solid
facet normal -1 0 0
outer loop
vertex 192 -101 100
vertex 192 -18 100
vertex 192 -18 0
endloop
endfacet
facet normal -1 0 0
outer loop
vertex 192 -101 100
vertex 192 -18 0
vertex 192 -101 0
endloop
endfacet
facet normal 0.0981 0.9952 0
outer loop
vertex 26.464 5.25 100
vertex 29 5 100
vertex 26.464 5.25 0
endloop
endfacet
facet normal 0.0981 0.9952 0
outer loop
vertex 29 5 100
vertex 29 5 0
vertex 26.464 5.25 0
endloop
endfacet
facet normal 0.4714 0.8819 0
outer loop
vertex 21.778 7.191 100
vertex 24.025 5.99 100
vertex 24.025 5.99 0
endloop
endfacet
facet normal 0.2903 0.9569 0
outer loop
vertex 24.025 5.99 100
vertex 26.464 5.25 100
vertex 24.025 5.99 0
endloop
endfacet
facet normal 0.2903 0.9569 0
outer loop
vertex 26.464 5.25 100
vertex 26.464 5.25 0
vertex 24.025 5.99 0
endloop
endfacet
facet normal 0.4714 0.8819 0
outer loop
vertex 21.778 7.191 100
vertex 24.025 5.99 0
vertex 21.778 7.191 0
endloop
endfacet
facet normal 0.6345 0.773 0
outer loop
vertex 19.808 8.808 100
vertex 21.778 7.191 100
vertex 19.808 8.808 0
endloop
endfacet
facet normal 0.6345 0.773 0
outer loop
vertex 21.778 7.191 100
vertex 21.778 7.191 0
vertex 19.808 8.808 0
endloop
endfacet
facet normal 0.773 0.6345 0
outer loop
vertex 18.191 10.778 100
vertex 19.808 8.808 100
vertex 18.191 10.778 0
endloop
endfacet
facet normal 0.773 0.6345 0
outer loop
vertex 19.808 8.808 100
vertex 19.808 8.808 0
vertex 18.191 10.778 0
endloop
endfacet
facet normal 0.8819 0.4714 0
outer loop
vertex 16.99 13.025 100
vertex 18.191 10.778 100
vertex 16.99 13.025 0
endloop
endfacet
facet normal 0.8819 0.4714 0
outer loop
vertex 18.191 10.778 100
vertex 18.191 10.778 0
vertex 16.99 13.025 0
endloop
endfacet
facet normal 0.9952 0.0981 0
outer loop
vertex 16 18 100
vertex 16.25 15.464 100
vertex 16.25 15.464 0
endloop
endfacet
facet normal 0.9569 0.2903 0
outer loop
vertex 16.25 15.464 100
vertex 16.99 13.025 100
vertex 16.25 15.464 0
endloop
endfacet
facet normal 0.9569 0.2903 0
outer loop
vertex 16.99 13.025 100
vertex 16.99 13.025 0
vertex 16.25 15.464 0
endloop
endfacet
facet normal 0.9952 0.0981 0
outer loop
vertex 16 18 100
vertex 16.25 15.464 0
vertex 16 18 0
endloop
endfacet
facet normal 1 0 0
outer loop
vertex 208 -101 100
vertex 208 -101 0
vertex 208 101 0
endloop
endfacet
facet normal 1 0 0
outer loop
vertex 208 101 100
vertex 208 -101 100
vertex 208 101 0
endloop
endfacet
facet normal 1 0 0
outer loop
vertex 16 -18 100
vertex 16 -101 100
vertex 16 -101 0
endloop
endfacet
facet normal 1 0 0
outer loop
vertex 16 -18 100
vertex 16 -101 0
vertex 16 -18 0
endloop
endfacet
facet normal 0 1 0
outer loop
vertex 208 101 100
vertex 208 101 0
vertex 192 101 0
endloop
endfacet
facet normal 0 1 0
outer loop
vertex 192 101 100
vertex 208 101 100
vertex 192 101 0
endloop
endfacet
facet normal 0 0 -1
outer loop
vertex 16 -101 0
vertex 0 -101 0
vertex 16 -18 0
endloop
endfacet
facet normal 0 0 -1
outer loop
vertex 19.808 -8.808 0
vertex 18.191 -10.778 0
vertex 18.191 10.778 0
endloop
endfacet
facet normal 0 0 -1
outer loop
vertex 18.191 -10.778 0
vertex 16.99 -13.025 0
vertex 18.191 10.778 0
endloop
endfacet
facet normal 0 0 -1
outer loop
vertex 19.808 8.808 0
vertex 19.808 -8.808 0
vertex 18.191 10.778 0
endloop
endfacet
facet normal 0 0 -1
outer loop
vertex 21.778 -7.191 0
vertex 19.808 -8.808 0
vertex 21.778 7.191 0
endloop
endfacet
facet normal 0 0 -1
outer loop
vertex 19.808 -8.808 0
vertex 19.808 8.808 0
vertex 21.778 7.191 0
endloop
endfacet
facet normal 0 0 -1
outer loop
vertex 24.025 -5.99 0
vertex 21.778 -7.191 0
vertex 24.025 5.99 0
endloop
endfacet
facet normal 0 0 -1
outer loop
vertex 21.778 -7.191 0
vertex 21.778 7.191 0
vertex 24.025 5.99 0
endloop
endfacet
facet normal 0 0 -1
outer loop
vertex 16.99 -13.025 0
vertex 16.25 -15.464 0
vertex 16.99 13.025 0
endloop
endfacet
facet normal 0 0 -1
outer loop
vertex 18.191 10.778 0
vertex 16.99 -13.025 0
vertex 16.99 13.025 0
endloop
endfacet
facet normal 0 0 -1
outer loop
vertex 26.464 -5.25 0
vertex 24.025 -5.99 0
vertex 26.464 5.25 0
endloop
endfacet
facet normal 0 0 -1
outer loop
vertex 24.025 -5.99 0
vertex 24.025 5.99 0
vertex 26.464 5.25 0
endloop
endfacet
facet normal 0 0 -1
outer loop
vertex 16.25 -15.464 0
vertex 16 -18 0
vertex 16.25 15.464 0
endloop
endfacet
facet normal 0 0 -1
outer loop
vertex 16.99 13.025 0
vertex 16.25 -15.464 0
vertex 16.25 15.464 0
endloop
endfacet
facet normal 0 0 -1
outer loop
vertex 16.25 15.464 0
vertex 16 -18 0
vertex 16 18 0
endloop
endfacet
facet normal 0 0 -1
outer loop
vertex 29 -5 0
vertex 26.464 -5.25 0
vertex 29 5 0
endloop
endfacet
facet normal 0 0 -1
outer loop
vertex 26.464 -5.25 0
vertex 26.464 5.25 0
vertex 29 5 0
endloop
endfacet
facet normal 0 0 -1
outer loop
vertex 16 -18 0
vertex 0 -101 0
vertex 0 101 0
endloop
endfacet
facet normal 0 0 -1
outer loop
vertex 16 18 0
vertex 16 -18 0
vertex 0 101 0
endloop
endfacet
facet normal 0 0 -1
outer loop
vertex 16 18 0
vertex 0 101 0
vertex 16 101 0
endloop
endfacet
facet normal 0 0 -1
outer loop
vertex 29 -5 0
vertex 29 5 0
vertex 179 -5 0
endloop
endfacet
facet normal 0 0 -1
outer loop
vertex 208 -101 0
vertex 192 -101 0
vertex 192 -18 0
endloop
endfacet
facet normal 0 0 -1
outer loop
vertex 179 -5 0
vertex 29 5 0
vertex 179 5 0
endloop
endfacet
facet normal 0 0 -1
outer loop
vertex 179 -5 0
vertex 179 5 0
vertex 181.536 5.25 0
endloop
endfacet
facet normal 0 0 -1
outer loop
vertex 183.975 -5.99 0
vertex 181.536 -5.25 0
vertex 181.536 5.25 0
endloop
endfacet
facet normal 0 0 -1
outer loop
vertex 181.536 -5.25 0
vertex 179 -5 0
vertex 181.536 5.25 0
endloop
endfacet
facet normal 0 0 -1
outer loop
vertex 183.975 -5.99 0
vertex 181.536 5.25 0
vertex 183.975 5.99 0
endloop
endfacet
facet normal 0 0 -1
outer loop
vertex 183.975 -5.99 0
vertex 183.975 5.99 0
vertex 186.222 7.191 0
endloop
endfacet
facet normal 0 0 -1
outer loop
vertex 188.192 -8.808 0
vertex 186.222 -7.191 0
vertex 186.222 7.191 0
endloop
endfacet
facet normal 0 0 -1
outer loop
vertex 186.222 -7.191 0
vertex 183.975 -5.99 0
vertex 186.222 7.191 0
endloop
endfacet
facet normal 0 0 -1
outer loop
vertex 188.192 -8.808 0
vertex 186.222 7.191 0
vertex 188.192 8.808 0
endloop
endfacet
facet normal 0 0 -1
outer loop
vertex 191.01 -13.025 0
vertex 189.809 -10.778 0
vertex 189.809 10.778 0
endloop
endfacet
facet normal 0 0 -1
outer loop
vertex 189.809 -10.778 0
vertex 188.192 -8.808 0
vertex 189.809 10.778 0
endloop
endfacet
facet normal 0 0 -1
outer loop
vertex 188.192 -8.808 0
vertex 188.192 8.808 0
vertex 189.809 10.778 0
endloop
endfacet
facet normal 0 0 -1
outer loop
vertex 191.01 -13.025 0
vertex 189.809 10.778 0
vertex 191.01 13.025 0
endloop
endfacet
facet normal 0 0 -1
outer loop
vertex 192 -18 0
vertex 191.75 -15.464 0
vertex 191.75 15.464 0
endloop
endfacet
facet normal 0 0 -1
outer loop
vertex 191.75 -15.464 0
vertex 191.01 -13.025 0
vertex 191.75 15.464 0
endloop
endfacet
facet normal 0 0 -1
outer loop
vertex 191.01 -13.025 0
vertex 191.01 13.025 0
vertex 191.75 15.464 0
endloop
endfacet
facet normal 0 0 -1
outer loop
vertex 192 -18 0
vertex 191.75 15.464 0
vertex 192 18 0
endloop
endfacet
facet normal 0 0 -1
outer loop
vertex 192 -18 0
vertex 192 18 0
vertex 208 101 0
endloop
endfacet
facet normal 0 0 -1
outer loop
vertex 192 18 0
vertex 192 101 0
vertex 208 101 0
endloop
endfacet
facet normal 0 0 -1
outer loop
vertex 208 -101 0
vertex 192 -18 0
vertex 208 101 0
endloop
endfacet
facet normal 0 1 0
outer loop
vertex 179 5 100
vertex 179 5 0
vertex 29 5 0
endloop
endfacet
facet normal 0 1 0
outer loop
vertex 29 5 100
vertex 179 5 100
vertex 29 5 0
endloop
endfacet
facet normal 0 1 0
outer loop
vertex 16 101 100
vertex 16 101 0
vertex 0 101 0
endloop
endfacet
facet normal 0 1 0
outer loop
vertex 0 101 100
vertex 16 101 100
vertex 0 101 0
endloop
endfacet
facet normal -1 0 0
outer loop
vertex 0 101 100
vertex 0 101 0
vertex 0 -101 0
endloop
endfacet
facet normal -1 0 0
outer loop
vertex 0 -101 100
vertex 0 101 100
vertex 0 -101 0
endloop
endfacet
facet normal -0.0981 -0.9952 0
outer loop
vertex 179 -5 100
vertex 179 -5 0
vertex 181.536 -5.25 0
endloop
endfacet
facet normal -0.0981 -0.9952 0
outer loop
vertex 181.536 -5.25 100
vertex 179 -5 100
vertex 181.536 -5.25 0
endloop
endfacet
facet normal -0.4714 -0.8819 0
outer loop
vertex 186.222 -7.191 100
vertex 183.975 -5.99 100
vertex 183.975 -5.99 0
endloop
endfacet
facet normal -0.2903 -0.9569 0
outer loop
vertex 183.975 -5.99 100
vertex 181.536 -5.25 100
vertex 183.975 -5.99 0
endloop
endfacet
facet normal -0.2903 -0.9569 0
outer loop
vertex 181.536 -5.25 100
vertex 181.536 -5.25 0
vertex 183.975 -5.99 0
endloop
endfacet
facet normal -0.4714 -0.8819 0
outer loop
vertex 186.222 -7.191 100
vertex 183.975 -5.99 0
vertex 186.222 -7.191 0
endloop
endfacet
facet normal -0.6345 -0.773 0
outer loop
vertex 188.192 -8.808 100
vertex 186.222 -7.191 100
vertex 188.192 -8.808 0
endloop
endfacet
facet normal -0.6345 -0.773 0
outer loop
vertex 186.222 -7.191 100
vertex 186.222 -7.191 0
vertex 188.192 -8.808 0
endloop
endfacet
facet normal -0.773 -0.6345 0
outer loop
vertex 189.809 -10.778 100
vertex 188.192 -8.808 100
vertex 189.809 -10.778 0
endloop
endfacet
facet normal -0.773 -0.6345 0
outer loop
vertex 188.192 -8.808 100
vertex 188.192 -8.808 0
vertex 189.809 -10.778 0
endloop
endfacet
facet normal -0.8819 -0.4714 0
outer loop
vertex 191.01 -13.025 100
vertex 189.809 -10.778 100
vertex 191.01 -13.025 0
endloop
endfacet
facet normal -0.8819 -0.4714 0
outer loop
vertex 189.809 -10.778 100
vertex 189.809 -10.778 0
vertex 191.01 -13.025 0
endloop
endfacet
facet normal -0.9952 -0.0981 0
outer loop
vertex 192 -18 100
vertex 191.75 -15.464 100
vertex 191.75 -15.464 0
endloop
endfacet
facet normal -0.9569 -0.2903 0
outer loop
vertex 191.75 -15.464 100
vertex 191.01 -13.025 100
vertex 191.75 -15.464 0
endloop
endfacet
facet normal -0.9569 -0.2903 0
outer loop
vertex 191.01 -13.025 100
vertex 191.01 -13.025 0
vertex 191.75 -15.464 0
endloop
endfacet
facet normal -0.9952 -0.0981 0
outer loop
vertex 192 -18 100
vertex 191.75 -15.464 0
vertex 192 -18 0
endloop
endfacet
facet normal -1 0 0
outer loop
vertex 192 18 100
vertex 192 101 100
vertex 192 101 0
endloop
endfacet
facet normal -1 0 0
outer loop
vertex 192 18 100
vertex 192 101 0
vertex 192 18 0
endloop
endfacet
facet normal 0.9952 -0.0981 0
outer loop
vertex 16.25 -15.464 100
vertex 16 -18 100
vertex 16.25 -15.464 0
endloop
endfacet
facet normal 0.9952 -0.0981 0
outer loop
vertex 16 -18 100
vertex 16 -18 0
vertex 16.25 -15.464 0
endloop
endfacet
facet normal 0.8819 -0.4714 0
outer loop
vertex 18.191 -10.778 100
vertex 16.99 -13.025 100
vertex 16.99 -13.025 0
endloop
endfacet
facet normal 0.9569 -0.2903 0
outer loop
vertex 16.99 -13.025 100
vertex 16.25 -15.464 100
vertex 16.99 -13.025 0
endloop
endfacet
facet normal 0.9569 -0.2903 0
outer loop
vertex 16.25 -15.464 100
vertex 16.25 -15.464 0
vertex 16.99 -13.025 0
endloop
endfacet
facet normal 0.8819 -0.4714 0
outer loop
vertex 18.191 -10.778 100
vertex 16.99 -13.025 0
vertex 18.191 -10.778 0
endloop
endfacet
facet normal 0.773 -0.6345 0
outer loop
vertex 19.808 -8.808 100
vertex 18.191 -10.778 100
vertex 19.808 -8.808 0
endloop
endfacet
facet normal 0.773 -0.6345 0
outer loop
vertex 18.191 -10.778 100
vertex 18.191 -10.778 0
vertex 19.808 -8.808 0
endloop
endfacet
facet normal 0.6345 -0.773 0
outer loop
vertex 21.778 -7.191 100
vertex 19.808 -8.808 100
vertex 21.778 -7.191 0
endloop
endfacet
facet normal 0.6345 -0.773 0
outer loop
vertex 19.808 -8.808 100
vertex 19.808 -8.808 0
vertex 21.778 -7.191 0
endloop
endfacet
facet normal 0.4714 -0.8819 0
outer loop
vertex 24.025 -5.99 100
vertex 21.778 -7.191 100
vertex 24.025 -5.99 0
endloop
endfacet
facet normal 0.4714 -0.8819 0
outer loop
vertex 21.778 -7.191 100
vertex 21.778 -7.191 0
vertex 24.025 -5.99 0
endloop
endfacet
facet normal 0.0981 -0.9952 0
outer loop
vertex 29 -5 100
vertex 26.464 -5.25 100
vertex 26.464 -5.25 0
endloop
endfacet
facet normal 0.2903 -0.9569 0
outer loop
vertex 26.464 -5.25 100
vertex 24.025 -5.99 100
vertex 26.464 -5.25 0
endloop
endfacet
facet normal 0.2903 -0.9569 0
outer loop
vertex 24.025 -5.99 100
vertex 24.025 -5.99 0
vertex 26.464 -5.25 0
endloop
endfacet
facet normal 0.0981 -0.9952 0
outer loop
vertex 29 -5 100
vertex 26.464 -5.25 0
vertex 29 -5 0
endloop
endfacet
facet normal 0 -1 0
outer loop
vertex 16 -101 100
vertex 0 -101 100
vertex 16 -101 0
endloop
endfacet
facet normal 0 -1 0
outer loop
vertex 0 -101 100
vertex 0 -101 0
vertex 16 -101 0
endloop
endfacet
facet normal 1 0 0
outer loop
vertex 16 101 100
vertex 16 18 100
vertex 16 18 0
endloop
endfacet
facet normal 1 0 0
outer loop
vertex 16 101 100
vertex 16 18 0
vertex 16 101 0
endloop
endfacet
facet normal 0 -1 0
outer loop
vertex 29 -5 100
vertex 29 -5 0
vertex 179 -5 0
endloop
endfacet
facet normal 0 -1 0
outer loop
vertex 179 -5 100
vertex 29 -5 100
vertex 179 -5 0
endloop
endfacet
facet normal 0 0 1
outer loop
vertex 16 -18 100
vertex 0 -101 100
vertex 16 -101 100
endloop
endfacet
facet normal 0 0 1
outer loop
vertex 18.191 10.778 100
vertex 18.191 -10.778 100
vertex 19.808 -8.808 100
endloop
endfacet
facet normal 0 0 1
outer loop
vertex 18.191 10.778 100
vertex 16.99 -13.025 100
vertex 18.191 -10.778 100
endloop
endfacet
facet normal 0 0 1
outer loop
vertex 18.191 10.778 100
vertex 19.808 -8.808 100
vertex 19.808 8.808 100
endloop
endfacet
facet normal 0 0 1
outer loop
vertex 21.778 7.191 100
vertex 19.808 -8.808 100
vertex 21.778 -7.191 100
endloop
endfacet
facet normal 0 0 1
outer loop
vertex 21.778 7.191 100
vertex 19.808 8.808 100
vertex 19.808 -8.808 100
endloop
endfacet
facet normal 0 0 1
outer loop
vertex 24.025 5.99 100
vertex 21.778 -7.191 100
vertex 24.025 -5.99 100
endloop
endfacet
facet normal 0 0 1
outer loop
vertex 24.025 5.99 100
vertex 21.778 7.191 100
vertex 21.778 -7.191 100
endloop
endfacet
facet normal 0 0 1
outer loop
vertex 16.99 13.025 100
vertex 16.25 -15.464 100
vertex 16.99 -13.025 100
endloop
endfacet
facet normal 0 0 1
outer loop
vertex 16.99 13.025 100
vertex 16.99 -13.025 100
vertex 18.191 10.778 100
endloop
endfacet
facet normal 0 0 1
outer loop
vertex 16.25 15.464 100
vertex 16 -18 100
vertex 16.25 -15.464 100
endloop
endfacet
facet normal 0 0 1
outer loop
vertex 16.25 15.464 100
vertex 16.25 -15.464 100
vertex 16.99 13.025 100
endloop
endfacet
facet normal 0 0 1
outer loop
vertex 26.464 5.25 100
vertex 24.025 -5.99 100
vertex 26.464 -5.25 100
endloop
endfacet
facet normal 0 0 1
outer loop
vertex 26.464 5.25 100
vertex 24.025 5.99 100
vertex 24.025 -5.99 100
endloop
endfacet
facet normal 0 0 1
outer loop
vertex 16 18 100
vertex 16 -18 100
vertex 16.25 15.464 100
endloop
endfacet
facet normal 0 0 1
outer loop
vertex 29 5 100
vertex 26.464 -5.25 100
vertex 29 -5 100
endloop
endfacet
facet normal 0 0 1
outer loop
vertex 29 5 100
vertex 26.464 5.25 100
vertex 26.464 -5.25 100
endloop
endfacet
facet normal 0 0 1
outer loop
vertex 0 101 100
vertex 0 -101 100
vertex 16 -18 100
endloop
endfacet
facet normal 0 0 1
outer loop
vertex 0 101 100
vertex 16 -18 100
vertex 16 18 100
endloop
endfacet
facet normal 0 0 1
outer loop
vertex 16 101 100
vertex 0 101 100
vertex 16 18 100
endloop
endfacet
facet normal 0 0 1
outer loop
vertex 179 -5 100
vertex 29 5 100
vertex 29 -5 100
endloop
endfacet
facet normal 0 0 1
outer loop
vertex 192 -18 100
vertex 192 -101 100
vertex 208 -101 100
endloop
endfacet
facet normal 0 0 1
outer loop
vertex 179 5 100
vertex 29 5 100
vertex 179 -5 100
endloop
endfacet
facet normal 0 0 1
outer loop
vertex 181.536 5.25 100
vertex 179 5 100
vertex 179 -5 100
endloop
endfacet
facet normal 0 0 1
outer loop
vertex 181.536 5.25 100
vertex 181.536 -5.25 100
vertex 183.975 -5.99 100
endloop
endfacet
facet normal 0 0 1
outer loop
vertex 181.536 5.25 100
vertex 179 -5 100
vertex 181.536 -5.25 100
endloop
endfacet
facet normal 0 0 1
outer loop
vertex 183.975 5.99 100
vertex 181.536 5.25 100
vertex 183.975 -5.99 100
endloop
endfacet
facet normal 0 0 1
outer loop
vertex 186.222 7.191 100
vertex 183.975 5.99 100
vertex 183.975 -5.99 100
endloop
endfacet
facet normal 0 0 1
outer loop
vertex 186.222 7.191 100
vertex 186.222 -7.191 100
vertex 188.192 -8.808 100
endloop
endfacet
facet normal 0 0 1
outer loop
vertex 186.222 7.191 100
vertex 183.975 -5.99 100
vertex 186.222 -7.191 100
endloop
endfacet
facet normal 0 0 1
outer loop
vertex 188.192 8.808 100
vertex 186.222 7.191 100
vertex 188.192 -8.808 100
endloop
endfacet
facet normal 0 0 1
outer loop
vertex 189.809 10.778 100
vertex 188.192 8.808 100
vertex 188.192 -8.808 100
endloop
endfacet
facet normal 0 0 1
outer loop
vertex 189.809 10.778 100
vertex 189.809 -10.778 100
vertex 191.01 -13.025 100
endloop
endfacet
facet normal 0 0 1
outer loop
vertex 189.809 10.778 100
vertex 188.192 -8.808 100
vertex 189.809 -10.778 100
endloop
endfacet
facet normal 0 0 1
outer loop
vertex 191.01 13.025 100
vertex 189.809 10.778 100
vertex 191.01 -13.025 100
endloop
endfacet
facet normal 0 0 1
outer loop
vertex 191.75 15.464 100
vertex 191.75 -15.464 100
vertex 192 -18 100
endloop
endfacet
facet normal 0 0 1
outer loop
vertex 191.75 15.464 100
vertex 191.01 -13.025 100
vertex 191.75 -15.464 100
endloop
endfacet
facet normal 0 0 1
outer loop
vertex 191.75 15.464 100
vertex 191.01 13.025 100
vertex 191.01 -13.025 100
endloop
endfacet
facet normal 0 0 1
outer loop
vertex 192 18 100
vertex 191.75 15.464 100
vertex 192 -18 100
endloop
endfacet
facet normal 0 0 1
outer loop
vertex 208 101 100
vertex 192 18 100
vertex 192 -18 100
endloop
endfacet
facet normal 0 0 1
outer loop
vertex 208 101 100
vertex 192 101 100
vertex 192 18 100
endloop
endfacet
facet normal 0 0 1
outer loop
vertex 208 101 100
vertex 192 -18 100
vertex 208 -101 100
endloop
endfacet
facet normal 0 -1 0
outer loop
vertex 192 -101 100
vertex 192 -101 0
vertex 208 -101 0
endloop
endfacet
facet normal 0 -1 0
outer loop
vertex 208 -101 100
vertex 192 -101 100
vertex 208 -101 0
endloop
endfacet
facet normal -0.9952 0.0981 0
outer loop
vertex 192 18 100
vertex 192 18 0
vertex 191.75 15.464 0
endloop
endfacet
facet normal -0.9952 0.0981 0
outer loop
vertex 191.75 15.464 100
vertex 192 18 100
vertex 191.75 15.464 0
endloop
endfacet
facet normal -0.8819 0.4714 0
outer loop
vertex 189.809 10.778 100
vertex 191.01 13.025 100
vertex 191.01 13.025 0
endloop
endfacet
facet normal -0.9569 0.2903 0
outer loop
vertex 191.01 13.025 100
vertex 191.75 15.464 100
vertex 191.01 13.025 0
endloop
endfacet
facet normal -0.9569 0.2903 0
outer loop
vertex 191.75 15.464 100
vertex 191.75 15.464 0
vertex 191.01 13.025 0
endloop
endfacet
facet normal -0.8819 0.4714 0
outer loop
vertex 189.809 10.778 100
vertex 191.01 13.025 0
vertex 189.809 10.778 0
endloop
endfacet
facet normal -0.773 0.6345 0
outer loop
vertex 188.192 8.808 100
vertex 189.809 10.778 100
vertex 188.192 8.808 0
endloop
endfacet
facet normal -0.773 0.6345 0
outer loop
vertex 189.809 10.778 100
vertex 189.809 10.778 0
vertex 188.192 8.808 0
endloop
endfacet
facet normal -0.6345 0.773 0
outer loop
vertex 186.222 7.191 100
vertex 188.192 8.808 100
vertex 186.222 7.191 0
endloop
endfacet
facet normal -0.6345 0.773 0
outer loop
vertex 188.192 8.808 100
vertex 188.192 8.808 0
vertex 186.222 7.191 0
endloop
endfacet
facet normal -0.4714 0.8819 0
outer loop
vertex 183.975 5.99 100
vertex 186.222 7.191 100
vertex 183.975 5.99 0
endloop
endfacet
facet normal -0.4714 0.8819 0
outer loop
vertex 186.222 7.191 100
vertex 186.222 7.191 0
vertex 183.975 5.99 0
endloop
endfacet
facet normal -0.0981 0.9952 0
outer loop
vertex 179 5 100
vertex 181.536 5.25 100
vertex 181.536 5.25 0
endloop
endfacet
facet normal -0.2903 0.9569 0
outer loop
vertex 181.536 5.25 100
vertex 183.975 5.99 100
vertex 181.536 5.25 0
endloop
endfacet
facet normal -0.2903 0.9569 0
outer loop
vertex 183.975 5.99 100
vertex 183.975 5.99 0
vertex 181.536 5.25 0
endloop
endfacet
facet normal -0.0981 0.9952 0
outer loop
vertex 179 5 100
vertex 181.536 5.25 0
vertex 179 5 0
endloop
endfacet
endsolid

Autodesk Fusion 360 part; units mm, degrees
sketch "スケッチ1" plane through (0, 0, 0) normal (0, 0, 1) x (1, 0, 0)
  line L0 (0, 101) -> (0, -101)
  line L1 (208, -101) -> (208, 101)
  line L2 (29, -5) -> (179, -5)
  line L3 (16, -101) -> (16, -18)
  line L4 (0, -101) -> (16, -101)
  arc A0 (29, -5) -> (16, -18) centre (29, -18) ccw
  line L5 (192, -18) -> (192, -101)
  line L6 (192, -101) -> (208, -101)
  arc A1 (192, -18) -> (179, -5) centre (179, -18) ccw
  line L7 (179, 5) -> (29, 5)
  line L8 (16, 18) -> (16, 101)
  arc A2 (16, 18) -> (29, 5) centre (29, 18) ccw
  line L9 (16, 101) -> (0, 101)
  line L10 (192, 101) -> (192, 18)
  arc A3 (179, 5) -> (192, 18) centre (179, 18) ccw
  line L11 (208, 101) -> (192, 101)
extrude "押し出し1" add sketch "スケッチ1" along normal blind 100
